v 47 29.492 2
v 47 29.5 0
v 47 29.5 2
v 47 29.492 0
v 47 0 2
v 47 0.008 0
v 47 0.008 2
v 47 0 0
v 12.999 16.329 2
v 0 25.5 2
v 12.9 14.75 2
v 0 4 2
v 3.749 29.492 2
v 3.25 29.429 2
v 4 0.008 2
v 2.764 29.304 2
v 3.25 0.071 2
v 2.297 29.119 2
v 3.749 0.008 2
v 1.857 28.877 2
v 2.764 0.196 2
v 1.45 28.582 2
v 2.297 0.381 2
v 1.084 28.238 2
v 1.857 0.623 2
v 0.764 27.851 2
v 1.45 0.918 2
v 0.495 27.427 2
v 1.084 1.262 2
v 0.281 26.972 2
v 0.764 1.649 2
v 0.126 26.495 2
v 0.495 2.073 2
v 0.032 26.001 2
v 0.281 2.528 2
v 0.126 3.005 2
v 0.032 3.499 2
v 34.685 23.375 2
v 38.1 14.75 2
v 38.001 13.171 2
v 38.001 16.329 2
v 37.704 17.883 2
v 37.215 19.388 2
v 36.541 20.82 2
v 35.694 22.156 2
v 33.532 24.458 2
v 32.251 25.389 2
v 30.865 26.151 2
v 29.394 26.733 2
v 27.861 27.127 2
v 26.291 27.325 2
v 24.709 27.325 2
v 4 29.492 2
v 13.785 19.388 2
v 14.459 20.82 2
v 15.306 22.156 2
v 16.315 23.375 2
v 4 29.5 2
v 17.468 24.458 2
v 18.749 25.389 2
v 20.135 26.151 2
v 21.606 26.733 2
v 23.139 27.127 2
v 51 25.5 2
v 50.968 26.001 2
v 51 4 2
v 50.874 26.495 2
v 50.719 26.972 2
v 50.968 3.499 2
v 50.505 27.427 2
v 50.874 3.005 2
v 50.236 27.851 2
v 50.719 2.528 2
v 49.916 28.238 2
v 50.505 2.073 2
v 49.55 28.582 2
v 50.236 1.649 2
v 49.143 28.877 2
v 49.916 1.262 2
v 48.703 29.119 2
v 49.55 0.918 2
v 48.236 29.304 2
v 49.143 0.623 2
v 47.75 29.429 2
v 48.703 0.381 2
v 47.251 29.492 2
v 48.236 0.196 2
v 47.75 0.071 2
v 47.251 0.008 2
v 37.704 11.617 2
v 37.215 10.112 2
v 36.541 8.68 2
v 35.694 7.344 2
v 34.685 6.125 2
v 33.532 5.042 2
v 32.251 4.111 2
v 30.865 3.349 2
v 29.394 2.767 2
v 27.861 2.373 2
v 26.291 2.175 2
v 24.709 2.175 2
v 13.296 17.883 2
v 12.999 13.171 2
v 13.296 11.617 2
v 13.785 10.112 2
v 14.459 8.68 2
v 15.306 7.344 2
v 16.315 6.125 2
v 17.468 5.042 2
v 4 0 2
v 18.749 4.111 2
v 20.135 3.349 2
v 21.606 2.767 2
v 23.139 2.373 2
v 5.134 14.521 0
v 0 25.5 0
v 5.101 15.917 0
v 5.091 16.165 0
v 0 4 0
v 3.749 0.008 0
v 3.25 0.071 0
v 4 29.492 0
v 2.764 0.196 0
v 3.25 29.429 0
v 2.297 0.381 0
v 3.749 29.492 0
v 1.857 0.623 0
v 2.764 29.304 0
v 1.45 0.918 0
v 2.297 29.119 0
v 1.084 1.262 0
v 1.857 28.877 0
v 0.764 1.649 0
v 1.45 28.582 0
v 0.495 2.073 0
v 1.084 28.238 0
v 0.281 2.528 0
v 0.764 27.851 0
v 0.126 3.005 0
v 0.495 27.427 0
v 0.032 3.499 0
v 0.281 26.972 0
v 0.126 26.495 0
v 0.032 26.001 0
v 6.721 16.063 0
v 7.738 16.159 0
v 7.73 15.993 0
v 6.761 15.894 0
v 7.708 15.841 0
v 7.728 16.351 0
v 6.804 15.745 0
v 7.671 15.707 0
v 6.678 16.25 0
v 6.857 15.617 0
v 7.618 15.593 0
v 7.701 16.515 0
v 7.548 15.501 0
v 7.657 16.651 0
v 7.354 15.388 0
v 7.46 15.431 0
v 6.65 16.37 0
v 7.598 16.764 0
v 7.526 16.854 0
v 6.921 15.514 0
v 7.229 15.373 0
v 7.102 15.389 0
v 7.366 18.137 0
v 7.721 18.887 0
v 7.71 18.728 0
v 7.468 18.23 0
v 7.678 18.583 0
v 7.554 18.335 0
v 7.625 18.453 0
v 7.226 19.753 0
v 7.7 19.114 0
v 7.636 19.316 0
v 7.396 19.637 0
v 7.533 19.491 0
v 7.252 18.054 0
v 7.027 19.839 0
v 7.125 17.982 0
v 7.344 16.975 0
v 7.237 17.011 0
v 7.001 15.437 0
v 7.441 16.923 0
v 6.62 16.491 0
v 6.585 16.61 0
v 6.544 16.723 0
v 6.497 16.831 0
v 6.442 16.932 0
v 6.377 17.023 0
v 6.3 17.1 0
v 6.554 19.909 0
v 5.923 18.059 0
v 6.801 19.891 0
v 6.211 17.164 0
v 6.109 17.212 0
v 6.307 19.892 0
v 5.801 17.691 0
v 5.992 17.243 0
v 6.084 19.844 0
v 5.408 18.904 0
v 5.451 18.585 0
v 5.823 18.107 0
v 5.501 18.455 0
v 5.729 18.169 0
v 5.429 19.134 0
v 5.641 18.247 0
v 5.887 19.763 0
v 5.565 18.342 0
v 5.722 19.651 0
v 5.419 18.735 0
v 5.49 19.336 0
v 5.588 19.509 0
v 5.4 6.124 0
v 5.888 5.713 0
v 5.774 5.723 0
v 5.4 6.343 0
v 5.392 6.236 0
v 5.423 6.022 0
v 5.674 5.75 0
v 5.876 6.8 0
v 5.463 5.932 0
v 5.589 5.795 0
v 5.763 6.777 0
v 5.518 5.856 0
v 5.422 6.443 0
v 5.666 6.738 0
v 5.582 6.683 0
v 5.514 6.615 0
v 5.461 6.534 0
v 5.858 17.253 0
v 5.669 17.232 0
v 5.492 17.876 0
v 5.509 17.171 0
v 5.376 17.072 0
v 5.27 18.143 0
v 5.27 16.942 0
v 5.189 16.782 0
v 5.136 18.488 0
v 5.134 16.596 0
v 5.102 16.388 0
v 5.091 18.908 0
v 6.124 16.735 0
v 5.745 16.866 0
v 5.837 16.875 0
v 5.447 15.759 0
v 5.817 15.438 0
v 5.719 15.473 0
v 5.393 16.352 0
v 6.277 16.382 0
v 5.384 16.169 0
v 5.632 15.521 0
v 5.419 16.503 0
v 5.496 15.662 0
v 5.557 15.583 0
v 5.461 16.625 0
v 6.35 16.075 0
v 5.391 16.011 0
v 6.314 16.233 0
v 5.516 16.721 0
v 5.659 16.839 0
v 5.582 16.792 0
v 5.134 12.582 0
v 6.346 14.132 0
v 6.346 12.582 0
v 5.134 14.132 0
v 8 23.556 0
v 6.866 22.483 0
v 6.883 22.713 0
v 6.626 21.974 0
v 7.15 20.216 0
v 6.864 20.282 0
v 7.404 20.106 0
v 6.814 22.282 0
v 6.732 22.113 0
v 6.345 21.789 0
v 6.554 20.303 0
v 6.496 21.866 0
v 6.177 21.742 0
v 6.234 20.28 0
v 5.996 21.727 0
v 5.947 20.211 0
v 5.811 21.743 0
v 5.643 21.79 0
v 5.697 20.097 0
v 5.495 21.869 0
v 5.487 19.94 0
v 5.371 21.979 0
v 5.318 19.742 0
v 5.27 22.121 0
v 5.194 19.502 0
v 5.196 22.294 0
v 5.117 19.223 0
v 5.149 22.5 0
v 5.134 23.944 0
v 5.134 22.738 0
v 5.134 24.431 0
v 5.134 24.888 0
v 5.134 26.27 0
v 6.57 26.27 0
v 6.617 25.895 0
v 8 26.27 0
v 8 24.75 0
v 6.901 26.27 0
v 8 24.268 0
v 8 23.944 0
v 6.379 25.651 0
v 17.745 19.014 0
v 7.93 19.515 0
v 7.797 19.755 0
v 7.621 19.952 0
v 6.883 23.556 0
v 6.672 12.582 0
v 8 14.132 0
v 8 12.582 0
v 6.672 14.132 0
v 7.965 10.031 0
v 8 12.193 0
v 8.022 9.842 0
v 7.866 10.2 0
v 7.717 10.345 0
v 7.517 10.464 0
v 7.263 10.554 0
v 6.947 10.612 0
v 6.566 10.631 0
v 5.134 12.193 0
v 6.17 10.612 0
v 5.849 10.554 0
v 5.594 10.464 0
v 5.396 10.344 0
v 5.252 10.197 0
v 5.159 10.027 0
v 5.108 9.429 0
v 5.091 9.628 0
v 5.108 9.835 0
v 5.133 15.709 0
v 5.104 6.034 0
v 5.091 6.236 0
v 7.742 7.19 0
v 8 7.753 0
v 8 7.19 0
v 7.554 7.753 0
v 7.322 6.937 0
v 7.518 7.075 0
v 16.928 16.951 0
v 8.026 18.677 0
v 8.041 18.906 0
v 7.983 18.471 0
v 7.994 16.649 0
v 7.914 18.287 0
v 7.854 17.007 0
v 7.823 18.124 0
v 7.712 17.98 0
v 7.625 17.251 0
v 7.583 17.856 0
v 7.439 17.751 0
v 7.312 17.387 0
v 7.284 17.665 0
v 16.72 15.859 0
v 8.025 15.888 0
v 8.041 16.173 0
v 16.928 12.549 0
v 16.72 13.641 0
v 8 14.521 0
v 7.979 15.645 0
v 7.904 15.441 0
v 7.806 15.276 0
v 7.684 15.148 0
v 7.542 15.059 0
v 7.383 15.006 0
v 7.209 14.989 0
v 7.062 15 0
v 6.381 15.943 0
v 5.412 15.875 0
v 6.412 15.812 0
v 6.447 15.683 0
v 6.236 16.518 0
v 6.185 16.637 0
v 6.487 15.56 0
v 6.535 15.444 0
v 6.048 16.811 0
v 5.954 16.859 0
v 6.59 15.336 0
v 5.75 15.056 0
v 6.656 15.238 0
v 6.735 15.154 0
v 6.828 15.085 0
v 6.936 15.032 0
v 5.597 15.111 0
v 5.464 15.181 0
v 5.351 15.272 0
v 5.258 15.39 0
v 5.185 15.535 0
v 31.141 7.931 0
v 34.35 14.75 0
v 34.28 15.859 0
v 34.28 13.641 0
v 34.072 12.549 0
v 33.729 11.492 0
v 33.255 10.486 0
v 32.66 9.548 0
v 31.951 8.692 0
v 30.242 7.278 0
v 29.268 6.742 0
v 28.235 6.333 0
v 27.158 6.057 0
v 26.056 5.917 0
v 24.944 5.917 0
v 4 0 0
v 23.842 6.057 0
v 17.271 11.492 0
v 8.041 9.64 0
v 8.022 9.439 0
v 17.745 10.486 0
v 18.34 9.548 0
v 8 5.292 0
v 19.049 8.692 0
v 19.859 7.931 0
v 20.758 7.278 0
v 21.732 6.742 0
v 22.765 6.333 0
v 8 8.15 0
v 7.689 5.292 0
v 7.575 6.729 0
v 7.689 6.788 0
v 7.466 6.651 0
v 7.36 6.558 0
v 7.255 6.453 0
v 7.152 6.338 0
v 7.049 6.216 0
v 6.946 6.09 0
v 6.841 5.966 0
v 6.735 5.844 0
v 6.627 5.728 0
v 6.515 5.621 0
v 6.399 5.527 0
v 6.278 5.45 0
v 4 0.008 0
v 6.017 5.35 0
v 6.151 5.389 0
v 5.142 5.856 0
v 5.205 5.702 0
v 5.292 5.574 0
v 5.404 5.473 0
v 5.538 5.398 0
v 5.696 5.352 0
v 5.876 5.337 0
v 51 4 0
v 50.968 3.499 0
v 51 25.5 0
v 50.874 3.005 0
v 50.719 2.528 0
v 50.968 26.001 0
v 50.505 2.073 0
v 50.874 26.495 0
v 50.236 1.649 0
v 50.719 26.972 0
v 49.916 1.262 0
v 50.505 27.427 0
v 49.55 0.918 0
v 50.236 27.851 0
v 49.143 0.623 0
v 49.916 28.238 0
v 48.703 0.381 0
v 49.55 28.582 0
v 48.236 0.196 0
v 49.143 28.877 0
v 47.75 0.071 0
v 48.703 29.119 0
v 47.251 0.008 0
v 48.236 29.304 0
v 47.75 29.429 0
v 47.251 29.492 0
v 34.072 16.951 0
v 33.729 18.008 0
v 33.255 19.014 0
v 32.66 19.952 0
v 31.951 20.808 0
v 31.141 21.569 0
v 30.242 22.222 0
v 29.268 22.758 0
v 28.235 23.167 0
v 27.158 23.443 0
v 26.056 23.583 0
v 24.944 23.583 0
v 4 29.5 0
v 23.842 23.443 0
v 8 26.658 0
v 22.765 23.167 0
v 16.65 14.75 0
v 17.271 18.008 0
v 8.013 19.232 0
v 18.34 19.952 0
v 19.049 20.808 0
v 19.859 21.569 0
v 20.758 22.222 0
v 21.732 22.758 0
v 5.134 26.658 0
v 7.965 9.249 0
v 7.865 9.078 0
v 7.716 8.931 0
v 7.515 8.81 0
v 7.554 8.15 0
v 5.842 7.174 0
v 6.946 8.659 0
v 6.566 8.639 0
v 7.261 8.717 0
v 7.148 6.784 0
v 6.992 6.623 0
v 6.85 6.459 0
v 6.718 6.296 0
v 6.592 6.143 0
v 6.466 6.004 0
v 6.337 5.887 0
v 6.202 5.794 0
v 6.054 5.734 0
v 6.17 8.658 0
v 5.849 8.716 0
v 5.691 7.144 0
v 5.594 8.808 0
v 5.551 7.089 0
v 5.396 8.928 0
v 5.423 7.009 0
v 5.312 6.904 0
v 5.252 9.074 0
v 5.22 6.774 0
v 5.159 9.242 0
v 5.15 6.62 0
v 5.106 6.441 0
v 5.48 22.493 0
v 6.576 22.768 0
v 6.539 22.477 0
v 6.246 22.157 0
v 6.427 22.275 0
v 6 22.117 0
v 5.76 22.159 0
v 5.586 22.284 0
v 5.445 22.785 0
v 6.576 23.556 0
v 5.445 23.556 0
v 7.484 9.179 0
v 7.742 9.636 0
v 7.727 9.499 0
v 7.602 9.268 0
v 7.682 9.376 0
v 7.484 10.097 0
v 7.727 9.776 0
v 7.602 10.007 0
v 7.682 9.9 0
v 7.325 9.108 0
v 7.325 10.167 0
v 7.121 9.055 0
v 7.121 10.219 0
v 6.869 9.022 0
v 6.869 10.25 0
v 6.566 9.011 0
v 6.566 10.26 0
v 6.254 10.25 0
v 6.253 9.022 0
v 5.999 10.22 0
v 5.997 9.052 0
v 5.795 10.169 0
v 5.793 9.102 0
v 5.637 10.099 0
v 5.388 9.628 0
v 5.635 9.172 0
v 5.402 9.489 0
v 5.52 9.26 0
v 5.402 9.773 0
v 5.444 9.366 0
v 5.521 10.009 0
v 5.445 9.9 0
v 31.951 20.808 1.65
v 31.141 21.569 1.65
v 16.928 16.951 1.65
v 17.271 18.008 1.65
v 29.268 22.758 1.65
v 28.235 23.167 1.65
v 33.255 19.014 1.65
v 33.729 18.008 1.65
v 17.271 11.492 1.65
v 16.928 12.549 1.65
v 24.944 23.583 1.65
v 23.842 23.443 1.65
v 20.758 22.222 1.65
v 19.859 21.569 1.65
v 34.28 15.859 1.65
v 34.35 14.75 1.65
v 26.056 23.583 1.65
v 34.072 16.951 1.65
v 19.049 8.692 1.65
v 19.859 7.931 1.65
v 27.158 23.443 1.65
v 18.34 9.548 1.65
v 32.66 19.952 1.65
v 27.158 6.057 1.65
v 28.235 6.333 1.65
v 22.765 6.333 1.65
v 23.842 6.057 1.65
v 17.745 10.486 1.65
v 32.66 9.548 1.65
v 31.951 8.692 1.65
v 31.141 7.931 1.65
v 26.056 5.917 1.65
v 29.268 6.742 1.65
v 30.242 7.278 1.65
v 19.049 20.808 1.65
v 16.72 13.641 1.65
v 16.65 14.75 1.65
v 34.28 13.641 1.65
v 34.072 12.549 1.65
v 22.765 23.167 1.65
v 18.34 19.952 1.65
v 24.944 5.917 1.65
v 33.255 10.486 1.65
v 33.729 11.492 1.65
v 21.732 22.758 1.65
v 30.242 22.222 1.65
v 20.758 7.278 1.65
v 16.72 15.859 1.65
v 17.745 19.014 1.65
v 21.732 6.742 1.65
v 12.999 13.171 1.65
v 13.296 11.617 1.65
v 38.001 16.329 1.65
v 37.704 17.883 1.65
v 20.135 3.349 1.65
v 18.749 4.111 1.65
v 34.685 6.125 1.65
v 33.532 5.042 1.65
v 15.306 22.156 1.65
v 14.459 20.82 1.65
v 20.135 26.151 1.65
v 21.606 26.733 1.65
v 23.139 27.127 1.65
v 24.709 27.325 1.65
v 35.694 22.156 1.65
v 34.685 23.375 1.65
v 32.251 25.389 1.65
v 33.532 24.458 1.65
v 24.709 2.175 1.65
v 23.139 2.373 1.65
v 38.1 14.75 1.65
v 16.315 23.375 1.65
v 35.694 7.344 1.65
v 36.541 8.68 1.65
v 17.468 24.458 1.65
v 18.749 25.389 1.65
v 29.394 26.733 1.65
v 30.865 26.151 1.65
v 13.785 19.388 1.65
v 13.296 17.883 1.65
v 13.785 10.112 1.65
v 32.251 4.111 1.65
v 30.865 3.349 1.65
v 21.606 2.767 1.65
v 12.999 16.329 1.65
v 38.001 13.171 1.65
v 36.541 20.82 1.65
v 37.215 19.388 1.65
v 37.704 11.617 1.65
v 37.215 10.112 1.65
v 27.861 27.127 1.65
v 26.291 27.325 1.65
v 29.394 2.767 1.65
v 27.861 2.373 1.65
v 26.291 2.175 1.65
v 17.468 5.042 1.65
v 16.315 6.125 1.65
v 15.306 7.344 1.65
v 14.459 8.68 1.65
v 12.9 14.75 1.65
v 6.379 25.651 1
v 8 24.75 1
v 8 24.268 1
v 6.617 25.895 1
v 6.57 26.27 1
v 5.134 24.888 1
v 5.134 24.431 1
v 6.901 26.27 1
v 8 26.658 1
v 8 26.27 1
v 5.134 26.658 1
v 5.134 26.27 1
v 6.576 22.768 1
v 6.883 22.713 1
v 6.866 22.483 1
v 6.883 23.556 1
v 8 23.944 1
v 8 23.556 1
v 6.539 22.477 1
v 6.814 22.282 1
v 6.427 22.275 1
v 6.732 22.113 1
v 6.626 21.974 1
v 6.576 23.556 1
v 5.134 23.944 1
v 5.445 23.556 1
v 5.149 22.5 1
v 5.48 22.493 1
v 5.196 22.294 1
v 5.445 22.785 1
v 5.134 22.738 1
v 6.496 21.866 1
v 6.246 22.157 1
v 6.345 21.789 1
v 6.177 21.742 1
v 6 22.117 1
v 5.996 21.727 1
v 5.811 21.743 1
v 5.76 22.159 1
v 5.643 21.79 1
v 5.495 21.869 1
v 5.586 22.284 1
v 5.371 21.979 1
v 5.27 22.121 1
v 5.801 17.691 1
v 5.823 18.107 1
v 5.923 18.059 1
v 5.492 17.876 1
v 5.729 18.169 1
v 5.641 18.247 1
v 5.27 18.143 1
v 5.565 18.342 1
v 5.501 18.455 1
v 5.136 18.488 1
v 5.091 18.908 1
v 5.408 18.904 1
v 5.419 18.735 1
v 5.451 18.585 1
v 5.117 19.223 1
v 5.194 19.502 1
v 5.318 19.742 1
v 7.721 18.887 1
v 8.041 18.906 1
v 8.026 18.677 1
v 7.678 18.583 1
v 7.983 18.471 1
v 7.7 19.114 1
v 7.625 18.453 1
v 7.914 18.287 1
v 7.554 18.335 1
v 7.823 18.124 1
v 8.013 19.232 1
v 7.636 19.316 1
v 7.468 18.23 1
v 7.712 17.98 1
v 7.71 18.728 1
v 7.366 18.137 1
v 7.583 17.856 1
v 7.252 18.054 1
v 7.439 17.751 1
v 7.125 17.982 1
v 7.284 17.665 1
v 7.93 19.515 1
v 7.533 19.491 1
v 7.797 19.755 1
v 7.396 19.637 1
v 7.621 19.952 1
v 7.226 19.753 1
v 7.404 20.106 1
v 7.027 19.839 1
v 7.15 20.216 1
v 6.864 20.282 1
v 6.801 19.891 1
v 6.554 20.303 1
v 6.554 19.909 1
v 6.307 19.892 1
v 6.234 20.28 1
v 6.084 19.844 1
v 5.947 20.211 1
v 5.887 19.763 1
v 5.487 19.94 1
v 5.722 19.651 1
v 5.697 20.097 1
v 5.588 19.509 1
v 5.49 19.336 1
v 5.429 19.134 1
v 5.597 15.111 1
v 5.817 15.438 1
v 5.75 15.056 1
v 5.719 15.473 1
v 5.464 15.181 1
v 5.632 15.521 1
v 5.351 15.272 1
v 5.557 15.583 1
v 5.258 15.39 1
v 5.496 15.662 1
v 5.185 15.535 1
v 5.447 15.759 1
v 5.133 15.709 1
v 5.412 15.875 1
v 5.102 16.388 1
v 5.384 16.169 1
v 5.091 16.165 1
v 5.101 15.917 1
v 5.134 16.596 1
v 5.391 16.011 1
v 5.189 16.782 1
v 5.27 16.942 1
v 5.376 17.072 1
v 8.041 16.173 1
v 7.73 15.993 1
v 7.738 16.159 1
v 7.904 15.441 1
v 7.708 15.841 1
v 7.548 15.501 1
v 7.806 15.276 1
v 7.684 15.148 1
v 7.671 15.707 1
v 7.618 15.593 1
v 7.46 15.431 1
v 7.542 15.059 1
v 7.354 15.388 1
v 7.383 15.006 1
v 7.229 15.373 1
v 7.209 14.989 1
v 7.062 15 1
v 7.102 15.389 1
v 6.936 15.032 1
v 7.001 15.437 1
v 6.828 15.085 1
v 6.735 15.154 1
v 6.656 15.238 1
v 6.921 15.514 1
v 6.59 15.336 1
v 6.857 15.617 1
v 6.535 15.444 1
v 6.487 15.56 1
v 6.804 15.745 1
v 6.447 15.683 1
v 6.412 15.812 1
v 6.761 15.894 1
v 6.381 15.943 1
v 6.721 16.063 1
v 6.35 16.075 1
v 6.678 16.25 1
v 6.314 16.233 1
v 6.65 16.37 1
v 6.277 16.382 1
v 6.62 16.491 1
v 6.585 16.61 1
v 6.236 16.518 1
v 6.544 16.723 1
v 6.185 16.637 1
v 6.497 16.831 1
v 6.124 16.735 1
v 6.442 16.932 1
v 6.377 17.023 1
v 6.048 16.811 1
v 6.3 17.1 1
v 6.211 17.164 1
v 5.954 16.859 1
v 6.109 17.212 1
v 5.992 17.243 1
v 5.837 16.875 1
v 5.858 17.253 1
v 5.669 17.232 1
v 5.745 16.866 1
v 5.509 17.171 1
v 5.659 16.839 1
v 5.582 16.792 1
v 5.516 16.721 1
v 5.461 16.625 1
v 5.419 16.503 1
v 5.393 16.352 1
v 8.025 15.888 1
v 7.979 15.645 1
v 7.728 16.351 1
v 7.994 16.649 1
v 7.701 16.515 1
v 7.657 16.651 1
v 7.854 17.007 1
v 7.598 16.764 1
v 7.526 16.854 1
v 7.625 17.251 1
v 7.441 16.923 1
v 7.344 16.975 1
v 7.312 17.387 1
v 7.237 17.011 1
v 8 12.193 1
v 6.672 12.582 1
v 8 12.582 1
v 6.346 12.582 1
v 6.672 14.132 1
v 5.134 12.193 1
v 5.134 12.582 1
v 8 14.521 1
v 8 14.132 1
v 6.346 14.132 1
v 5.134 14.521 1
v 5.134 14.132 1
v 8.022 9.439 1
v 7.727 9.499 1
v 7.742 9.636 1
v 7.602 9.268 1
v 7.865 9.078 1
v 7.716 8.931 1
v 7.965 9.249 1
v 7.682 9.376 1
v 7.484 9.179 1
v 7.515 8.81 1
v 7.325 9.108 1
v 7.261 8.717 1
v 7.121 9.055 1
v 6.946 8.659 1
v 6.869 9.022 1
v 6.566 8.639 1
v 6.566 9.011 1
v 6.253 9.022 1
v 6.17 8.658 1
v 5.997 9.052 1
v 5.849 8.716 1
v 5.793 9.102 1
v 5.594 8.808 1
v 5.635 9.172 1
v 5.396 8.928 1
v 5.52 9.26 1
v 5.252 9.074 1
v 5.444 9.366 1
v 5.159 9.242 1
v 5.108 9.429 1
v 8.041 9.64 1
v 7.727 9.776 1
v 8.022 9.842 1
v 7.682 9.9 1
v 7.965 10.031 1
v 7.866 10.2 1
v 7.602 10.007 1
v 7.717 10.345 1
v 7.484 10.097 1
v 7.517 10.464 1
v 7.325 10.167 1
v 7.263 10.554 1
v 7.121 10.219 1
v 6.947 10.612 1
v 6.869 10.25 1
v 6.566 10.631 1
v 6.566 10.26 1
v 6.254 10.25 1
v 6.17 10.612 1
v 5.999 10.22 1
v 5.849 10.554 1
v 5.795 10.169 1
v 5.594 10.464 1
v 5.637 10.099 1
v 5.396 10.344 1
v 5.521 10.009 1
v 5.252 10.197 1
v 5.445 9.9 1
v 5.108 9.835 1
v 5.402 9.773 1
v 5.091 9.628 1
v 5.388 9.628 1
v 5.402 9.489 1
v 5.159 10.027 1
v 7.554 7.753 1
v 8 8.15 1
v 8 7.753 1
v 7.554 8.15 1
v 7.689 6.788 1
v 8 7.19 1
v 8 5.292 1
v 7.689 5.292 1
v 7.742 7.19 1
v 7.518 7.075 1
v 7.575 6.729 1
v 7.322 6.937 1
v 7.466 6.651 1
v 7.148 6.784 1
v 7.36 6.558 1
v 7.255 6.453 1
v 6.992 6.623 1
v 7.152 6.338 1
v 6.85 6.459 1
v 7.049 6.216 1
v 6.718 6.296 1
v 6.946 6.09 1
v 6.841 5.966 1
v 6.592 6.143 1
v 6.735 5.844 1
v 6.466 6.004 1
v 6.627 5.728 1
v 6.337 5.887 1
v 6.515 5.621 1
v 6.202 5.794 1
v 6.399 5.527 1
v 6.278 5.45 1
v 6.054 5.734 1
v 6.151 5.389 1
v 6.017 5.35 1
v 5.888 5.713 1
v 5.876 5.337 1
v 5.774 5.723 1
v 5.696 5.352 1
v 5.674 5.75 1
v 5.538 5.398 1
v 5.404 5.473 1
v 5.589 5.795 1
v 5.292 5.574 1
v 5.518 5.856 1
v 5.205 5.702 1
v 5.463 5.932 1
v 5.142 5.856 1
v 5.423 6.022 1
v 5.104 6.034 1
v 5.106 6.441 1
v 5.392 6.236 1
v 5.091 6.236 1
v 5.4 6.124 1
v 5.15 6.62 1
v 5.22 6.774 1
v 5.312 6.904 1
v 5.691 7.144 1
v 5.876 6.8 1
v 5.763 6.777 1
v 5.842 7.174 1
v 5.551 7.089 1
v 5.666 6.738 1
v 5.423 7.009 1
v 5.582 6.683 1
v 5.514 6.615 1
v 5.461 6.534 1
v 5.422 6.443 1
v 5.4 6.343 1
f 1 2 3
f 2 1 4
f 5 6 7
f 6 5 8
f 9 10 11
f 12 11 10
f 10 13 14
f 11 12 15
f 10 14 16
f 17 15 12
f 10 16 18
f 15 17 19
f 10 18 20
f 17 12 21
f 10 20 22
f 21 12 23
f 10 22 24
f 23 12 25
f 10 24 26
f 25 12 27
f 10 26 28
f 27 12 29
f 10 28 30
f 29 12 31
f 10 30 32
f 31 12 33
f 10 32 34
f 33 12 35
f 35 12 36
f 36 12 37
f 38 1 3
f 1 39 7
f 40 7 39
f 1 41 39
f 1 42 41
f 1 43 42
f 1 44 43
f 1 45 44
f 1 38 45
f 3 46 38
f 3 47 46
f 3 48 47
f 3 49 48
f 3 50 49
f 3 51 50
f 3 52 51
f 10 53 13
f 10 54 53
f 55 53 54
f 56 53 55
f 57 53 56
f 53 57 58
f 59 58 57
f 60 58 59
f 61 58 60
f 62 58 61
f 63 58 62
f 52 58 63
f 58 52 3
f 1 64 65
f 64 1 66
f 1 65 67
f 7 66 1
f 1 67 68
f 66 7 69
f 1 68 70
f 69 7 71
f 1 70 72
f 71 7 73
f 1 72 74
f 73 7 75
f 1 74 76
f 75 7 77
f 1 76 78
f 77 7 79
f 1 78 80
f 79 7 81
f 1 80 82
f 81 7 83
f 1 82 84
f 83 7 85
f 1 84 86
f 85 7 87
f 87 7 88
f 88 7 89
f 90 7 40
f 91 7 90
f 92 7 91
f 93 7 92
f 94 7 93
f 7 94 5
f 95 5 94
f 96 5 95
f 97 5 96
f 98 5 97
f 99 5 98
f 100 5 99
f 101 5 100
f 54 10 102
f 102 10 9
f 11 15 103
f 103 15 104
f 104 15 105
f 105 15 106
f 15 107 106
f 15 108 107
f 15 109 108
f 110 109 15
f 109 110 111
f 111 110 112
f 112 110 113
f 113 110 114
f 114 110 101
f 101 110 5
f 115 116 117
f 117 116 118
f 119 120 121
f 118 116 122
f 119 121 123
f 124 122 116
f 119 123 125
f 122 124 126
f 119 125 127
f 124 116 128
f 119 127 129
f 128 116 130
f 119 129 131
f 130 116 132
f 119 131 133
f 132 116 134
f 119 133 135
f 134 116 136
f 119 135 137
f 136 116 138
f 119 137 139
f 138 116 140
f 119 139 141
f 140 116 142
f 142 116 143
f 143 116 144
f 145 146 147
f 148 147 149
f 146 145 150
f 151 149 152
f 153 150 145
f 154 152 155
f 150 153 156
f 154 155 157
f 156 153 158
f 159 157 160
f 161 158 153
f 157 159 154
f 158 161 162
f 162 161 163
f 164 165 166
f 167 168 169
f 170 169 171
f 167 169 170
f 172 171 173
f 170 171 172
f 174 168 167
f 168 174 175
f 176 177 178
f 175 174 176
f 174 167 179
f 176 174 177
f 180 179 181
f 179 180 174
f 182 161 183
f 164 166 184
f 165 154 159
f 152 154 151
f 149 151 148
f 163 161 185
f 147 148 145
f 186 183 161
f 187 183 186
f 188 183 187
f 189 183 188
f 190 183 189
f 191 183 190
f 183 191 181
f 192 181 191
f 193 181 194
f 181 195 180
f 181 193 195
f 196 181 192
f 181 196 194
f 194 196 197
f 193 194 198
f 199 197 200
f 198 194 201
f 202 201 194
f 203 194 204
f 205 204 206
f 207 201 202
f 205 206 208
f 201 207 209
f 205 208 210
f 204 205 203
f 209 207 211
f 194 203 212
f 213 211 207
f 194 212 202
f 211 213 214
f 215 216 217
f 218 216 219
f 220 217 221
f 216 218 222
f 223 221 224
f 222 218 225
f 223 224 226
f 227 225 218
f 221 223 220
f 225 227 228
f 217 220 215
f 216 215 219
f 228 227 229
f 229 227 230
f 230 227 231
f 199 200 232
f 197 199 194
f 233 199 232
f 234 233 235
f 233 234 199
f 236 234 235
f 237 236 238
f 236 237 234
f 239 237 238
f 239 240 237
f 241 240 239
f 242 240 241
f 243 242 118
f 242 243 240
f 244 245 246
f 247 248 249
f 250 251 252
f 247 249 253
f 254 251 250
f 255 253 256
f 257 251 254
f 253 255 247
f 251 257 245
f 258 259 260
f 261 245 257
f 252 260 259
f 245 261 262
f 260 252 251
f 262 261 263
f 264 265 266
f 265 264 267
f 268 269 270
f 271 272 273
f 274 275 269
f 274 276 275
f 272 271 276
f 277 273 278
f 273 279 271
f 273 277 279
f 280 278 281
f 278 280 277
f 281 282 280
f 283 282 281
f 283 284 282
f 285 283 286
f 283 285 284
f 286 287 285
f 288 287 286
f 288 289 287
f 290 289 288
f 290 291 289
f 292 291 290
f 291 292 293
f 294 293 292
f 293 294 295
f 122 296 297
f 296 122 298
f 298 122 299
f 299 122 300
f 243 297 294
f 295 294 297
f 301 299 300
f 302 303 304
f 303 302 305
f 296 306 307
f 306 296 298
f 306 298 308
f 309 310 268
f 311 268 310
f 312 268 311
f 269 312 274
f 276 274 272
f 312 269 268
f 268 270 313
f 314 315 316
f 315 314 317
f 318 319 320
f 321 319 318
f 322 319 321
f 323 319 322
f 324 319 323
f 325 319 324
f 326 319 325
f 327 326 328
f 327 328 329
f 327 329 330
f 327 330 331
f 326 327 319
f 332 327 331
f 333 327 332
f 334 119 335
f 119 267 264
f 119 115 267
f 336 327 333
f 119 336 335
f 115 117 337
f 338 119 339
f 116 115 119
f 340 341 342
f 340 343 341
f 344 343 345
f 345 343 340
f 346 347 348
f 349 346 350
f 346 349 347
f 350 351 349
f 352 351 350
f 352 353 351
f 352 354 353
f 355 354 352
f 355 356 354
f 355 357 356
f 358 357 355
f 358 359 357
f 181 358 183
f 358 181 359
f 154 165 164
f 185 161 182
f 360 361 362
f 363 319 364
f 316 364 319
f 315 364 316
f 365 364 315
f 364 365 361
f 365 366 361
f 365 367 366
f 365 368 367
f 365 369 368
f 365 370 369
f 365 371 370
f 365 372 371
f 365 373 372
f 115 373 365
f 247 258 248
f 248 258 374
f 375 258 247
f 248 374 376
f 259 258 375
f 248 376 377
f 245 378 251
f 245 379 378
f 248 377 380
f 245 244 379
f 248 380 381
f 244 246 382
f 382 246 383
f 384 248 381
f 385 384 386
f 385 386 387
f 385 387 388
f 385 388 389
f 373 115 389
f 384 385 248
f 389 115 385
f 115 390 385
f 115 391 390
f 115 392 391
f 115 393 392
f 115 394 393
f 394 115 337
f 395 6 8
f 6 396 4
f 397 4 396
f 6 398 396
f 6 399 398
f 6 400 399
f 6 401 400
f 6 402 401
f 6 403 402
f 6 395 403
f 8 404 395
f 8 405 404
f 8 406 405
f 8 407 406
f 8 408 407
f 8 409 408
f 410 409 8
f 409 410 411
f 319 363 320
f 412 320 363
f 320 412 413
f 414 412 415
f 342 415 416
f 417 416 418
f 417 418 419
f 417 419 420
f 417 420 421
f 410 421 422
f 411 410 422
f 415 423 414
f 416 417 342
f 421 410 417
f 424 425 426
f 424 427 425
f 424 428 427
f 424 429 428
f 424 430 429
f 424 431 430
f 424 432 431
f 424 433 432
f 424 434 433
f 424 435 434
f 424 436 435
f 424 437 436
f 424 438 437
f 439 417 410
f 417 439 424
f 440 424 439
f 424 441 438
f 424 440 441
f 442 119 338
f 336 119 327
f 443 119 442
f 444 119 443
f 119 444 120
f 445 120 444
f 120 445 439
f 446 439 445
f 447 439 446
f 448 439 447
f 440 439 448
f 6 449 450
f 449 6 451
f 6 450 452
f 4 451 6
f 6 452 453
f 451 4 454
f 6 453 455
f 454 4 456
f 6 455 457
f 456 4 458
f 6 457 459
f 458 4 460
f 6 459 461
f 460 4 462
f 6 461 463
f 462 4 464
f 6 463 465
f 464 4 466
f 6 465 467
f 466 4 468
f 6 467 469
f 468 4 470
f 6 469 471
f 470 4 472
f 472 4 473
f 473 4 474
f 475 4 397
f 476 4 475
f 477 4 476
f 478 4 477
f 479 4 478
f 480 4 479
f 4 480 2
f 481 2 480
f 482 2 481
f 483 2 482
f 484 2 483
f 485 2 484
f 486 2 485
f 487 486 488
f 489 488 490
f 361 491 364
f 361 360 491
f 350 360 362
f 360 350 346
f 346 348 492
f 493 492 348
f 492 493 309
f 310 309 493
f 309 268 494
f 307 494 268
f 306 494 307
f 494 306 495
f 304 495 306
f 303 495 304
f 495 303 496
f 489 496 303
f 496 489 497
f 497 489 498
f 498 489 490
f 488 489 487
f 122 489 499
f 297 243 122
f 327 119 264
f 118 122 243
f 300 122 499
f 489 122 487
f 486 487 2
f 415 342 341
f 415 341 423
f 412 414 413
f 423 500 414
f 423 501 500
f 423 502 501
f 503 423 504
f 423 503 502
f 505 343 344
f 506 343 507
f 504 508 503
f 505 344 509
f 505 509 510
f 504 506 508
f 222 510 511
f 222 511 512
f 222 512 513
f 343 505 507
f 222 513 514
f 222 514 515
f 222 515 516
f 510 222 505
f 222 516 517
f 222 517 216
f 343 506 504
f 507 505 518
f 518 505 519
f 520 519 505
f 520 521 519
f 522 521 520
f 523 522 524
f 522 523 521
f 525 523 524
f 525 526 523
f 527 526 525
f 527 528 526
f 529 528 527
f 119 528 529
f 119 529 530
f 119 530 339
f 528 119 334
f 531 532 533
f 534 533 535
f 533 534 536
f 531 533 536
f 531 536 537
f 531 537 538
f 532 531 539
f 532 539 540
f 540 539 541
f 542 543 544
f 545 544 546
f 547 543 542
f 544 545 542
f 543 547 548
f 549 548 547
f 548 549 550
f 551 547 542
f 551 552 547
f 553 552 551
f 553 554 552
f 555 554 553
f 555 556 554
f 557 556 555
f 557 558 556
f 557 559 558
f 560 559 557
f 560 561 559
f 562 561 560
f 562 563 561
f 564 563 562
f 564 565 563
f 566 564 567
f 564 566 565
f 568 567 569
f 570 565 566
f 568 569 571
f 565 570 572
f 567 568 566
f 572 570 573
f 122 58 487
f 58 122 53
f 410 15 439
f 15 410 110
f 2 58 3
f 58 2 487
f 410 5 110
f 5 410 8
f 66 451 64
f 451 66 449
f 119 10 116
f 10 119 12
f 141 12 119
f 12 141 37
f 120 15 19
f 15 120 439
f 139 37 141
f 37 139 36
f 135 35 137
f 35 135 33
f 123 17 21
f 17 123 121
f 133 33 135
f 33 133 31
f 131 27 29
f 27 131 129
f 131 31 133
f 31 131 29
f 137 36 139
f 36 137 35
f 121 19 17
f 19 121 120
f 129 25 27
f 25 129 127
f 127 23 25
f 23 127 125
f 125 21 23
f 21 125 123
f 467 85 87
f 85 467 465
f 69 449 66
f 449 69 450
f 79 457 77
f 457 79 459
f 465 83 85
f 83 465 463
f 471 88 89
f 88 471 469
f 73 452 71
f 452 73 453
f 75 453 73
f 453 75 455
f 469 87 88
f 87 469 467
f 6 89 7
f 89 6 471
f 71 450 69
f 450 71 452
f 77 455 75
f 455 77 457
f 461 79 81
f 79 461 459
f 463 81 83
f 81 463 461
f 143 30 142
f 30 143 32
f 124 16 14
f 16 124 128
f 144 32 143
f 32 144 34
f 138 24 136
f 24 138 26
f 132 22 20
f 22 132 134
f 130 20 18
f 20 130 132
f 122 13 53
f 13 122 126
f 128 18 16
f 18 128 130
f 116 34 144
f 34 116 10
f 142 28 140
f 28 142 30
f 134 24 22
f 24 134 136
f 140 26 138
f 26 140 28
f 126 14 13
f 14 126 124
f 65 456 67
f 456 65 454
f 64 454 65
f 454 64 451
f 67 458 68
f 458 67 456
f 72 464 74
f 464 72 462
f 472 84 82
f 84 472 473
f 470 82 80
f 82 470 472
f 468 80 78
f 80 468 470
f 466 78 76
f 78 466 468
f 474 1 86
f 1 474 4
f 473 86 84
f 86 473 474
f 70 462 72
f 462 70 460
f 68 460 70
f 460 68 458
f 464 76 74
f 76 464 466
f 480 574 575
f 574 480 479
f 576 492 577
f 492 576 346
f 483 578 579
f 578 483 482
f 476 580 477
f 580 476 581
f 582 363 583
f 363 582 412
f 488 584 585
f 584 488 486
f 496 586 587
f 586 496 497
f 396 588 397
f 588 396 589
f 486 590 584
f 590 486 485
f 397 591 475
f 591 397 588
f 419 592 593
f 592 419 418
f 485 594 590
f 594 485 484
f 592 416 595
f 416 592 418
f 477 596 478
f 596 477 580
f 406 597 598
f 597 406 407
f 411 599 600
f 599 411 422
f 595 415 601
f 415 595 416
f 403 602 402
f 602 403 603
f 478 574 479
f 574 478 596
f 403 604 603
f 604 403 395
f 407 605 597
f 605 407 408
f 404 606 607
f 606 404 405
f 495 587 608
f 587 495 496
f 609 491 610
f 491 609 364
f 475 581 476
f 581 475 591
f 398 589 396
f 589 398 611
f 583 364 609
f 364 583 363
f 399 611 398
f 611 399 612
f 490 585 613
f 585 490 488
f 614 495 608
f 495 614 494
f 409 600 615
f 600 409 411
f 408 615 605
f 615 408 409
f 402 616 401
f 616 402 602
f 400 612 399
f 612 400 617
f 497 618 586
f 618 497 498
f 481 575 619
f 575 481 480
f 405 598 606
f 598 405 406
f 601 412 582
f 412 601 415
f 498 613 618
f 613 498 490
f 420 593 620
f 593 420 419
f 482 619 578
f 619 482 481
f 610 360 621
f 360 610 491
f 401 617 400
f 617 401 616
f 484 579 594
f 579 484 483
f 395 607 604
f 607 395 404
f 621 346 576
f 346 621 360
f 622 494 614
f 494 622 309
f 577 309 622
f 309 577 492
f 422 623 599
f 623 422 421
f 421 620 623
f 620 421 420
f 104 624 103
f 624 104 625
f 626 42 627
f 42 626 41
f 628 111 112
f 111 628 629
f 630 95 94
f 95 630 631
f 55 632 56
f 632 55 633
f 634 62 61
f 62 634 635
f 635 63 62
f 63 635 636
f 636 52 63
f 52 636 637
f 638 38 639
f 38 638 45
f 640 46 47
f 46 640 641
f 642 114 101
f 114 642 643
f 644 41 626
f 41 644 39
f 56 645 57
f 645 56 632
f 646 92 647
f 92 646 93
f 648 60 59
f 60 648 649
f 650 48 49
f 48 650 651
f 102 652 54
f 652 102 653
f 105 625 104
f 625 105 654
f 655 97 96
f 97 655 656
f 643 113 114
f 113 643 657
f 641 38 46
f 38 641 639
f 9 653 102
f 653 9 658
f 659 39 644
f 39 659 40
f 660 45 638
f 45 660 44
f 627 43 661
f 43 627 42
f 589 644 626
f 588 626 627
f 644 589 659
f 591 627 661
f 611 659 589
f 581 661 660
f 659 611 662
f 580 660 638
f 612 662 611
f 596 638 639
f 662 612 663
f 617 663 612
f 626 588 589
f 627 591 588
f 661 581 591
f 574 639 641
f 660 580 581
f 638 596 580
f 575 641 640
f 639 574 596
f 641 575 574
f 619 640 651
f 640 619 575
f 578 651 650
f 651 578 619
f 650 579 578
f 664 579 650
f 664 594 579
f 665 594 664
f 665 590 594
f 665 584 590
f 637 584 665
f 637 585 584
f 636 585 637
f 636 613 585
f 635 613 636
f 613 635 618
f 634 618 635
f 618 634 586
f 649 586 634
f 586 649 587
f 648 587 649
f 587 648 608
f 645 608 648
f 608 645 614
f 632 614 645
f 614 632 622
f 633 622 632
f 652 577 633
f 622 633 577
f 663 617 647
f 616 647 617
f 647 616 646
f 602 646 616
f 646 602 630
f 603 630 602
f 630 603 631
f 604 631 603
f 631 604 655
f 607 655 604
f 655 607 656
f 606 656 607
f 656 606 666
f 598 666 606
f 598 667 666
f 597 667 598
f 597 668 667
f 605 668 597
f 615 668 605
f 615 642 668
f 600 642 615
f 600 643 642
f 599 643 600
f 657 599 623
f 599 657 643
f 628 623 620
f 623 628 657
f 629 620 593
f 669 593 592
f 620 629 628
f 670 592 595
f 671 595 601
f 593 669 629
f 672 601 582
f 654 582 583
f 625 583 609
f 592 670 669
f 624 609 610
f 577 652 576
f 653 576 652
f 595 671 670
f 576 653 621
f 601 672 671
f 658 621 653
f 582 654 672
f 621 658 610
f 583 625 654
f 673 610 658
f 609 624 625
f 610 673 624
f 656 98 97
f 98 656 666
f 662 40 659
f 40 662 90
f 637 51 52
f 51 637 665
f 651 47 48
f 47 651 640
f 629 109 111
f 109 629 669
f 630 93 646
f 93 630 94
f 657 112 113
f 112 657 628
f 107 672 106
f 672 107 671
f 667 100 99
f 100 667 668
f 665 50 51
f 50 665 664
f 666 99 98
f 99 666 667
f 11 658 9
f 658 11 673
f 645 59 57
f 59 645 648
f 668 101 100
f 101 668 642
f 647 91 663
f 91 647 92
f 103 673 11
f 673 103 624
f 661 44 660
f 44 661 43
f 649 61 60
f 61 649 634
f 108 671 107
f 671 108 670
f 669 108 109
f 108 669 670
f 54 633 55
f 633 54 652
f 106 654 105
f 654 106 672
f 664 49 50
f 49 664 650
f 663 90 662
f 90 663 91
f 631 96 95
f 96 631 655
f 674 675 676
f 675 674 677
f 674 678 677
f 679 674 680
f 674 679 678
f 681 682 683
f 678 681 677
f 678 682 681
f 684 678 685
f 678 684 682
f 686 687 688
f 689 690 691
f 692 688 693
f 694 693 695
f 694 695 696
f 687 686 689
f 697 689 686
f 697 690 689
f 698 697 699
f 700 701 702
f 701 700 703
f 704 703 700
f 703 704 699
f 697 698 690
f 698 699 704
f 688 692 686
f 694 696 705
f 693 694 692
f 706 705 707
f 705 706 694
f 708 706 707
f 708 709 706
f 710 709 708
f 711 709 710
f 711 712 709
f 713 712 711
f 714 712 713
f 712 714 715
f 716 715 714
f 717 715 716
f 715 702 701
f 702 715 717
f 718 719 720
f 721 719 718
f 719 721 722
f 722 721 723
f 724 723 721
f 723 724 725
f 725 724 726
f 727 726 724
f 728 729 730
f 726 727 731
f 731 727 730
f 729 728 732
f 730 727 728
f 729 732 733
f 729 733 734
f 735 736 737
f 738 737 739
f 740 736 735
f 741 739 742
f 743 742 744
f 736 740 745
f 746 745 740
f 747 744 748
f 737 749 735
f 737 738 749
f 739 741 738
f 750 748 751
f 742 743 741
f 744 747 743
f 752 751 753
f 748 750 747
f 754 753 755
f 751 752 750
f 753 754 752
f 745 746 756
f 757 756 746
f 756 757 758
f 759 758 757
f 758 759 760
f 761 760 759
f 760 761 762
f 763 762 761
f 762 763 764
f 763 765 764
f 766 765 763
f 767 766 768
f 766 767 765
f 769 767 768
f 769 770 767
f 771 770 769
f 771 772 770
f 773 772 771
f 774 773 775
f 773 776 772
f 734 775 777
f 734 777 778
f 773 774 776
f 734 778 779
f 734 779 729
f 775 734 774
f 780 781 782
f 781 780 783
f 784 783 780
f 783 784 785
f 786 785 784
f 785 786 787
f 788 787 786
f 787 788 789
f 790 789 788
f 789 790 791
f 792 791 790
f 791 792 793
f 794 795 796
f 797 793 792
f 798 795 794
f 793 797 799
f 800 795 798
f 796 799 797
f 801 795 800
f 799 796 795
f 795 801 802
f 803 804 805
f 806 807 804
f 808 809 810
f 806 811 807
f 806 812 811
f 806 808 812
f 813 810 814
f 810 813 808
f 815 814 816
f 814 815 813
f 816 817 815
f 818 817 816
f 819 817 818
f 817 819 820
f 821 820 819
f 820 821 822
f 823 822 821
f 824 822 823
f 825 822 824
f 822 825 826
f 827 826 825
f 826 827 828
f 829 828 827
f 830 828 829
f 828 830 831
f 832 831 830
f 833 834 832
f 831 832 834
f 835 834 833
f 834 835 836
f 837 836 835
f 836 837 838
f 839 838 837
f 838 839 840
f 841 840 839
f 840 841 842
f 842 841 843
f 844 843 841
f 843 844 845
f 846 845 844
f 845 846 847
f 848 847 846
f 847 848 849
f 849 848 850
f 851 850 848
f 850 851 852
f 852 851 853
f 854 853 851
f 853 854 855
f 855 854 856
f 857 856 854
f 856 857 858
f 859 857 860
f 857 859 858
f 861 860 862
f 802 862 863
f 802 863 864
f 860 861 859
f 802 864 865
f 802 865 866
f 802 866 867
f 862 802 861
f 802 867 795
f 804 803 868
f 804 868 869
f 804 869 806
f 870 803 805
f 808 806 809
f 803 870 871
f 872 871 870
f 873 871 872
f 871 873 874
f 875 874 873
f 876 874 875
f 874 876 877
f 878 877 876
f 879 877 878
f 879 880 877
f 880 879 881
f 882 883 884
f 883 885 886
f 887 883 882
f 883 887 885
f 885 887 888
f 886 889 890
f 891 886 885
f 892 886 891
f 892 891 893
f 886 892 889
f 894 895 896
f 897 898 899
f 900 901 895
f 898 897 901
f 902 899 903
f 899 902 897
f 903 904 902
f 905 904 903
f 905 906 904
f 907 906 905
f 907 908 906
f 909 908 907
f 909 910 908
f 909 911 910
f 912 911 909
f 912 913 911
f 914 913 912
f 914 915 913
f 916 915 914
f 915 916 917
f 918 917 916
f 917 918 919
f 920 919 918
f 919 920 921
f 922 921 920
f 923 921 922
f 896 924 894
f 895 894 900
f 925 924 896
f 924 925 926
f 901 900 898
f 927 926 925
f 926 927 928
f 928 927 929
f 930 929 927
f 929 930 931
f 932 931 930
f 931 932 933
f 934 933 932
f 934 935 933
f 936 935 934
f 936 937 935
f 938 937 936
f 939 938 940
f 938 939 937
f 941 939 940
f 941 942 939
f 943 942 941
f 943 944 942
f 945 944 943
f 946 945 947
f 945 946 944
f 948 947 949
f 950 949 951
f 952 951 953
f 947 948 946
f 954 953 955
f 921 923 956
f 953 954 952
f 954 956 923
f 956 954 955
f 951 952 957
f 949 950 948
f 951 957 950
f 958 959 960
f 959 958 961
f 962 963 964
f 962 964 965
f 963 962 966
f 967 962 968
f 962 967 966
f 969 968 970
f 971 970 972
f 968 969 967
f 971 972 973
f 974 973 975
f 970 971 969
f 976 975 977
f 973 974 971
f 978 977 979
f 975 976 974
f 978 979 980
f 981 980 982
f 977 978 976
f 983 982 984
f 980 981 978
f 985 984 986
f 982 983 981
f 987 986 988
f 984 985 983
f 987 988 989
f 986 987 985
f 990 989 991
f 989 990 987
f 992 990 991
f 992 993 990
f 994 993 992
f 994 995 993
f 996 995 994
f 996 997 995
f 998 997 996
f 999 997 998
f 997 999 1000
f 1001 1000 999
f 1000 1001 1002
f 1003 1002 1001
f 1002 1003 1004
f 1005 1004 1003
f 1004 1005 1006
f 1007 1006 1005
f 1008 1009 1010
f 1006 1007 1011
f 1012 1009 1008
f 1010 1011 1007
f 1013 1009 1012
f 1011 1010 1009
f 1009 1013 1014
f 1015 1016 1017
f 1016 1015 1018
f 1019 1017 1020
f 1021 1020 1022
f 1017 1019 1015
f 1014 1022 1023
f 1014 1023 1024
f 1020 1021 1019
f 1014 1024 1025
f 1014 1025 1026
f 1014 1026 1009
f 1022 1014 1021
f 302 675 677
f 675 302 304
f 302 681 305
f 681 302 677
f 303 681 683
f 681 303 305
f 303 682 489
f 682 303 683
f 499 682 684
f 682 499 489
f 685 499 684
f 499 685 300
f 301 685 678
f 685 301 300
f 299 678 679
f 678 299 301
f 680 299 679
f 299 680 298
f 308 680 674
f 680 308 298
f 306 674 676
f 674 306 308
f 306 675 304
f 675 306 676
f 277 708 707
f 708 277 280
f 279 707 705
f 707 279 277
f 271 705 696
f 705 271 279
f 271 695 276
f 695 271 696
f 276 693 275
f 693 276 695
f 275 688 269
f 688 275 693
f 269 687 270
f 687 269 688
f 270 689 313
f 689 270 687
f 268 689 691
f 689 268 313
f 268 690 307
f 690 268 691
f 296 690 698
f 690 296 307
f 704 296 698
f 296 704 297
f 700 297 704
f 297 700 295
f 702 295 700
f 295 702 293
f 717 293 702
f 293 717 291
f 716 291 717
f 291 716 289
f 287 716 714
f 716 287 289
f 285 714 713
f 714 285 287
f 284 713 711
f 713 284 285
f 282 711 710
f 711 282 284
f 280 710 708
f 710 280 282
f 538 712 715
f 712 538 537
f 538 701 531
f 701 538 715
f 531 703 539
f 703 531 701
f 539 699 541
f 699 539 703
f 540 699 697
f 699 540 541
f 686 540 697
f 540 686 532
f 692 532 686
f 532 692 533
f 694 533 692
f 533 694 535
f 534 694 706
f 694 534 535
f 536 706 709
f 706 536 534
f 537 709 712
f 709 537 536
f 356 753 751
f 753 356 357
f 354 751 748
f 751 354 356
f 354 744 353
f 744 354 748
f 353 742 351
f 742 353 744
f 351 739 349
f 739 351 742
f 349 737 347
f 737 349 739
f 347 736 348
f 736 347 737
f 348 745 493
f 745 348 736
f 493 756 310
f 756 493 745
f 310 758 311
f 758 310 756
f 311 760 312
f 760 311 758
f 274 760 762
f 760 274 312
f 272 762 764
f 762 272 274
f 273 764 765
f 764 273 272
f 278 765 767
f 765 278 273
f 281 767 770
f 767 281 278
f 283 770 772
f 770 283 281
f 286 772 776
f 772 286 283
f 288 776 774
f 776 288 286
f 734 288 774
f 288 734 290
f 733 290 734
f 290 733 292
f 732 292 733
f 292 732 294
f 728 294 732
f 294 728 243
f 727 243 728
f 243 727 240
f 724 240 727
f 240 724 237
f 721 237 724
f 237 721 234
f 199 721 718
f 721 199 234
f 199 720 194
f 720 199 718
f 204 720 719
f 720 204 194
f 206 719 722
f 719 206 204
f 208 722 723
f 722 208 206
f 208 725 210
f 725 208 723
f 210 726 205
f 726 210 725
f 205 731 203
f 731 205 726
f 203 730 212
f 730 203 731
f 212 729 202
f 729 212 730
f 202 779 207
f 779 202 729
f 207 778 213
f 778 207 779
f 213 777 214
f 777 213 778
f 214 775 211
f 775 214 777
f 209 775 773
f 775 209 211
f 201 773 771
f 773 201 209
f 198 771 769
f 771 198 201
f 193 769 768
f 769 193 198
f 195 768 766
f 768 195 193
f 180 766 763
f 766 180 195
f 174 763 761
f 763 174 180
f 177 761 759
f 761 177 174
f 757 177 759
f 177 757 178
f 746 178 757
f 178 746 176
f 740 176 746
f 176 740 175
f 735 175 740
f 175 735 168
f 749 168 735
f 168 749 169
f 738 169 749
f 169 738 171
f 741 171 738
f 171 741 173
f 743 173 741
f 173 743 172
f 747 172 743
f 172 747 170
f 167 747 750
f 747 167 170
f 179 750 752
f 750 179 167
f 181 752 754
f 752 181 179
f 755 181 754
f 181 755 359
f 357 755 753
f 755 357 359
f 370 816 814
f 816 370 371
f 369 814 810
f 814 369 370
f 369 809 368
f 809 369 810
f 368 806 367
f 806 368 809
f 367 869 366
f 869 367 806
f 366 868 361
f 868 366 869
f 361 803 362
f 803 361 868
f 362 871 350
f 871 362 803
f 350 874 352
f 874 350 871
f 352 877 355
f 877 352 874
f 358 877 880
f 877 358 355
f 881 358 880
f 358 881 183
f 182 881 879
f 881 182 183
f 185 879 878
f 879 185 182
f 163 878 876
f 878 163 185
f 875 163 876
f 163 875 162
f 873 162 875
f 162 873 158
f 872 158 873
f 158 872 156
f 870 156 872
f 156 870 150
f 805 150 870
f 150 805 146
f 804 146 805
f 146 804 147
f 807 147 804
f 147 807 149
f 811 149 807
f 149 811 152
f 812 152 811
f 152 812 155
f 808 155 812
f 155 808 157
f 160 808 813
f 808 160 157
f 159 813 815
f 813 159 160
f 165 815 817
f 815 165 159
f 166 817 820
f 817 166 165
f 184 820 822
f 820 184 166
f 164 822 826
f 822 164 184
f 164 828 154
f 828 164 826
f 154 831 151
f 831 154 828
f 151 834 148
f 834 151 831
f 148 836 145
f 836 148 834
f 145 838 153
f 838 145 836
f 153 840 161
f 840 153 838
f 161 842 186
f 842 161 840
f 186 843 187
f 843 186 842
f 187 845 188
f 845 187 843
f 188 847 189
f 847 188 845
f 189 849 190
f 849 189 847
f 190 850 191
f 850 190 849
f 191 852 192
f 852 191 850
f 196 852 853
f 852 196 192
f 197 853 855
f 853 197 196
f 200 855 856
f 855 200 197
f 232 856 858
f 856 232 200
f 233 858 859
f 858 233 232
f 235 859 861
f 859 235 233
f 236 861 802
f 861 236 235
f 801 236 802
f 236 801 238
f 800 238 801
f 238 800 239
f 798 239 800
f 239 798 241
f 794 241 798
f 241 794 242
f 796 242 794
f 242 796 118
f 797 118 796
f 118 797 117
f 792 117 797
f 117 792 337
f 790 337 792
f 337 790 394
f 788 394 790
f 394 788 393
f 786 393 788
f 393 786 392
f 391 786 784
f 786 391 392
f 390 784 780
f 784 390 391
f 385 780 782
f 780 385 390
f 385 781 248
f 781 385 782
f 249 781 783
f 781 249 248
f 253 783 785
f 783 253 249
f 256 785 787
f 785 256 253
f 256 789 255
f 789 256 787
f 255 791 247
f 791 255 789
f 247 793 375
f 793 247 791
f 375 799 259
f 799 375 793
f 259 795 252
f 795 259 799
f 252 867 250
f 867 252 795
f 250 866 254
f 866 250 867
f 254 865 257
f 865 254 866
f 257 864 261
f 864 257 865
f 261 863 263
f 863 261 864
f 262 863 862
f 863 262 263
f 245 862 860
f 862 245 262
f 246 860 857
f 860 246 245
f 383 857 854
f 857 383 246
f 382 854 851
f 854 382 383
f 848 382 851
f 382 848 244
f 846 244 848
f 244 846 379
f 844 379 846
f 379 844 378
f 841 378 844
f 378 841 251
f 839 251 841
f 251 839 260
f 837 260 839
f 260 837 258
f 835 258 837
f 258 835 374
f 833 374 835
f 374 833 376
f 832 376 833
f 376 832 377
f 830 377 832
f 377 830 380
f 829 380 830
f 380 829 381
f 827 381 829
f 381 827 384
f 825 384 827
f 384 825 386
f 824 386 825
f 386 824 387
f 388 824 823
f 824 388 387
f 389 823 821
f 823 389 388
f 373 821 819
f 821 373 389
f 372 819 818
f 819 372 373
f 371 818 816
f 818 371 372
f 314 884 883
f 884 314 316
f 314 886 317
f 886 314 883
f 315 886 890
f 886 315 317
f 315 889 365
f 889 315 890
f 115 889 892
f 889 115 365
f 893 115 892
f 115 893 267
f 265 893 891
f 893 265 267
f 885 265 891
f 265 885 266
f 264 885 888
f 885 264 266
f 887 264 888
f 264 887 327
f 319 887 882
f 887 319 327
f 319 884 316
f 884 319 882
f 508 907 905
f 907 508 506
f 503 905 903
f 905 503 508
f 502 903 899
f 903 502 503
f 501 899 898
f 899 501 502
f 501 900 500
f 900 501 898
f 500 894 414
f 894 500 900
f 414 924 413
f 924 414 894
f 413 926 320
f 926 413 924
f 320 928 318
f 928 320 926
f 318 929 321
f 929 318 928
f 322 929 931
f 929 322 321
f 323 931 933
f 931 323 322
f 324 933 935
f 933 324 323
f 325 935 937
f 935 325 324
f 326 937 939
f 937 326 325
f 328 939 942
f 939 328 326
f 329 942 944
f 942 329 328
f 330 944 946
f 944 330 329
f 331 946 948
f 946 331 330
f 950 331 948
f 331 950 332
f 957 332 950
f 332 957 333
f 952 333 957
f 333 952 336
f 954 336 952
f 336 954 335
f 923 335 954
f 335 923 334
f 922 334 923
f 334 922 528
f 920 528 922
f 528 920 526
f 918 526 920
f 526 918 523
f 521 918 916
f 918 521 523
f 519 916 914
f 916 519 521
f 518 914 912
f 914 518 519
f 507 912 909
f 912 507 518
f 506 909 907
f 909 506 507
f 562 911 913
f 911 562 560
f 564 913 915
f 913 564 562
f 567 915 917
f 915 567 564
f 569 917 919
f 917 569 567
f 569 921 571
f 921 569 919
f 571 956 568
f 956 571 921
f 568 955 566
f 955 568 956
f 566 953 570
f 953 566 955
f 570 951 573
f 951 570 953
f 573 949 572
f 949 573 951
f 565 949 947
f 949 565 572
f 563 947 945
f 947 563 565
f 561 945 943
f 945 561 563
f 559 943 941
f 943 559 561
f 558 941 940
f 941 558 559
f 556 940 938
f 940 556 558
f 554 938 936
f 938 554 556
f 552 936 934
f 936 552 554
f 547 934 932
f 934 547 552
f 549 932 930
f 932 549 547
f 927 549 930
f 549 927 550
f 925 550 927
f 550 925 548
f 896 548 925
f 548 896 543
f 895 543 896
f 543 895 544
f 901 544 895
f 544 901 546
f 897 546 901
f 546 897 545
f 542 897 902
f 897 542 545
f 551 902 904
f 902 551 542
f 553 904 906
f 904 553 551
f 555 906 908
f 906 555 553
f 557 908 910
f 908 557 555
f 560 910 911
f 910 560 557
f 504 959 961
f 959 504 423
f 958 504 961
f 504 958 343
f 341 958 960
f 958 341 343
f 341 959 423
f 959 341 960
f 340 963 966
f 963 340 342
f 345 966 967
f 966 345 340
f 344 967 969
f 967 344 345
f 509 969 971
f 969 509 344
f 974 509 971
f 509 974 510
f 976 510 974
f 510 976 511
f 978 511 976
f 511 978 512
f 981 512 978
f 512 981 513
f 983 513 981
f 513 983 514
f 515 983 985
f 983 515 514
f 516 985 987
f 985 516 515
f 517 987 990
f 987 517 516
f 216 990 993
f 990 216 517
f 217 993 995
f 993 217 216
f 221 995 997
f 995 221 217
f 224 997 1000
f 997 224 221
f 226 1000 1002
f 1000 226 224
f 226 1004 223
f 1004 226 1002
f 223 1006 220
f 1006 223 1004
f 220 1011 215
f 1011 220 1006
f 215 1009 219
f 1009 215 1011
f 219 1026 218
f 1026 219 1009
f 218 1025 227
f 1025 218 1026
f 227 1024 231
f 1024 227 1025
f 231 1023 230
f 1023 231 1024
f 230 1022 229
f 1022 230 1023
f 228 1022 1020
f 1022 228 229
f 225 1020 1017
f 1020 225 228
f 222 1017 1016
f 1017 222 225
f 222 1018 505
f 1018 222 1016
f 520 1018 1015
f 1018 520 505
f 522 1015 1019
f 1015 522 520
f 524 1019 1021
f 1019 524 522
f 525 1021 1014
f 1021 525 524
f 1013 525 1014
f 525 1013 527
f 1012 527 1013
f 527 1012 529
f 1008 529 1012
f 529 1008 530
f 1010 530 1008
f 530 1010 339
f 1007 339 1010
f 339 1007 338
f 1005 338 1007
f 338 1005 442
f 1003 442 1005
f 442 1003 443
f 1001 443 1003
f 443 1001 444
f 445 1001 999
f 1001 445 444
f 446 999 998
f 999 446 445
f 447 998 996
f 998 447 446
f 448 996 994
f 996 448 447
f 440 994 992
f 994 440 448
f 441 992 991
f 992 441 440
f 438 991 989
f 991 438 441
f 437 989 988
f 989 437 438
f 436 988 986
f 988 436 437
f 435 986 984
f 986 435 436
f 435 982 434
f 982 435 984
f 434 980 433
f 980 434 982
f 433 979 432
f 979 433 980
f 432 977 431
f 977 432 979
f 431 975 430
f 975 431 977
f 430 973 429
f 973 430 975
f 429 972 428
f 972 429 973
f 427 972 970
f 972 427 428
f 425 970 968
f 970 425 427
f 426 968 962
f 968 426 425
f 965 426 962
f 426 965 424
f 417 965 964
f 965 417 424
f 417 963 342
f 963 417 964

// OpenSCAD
difference()
    {
    union()
        {
        translate([4,0,0]) cube([43,29.5,2]);
        translate([0,4,0]) cube([51,21.5,2]);   
        translate([4,4,0]) cylinder(r=4,h=2, $fn=50);
        translate([47,4,0]) cylinder(r=4,h=2, $fn=50);
        translate([4,25.5,0]) cylinder(r=4,h=2, $fn=50);
        translate([47,25.5,0]) cylinder(r=4,h=2, $fn=50);
        }
    translate([25.5,14.75,0]) cylinder(r=8.85,h=2, $fn=50);
    translate([25.5,14.75,1.65]) cylinder(r=12.6,h=0.35, $fn=50);
    translate([8,27,0]) 
        linear_extrude(height = 1) {
            rotate ([0,180,90]){
            text("KP CSH 0.2", size=3, direction = "ltr");
    }       
}
}
    
    
